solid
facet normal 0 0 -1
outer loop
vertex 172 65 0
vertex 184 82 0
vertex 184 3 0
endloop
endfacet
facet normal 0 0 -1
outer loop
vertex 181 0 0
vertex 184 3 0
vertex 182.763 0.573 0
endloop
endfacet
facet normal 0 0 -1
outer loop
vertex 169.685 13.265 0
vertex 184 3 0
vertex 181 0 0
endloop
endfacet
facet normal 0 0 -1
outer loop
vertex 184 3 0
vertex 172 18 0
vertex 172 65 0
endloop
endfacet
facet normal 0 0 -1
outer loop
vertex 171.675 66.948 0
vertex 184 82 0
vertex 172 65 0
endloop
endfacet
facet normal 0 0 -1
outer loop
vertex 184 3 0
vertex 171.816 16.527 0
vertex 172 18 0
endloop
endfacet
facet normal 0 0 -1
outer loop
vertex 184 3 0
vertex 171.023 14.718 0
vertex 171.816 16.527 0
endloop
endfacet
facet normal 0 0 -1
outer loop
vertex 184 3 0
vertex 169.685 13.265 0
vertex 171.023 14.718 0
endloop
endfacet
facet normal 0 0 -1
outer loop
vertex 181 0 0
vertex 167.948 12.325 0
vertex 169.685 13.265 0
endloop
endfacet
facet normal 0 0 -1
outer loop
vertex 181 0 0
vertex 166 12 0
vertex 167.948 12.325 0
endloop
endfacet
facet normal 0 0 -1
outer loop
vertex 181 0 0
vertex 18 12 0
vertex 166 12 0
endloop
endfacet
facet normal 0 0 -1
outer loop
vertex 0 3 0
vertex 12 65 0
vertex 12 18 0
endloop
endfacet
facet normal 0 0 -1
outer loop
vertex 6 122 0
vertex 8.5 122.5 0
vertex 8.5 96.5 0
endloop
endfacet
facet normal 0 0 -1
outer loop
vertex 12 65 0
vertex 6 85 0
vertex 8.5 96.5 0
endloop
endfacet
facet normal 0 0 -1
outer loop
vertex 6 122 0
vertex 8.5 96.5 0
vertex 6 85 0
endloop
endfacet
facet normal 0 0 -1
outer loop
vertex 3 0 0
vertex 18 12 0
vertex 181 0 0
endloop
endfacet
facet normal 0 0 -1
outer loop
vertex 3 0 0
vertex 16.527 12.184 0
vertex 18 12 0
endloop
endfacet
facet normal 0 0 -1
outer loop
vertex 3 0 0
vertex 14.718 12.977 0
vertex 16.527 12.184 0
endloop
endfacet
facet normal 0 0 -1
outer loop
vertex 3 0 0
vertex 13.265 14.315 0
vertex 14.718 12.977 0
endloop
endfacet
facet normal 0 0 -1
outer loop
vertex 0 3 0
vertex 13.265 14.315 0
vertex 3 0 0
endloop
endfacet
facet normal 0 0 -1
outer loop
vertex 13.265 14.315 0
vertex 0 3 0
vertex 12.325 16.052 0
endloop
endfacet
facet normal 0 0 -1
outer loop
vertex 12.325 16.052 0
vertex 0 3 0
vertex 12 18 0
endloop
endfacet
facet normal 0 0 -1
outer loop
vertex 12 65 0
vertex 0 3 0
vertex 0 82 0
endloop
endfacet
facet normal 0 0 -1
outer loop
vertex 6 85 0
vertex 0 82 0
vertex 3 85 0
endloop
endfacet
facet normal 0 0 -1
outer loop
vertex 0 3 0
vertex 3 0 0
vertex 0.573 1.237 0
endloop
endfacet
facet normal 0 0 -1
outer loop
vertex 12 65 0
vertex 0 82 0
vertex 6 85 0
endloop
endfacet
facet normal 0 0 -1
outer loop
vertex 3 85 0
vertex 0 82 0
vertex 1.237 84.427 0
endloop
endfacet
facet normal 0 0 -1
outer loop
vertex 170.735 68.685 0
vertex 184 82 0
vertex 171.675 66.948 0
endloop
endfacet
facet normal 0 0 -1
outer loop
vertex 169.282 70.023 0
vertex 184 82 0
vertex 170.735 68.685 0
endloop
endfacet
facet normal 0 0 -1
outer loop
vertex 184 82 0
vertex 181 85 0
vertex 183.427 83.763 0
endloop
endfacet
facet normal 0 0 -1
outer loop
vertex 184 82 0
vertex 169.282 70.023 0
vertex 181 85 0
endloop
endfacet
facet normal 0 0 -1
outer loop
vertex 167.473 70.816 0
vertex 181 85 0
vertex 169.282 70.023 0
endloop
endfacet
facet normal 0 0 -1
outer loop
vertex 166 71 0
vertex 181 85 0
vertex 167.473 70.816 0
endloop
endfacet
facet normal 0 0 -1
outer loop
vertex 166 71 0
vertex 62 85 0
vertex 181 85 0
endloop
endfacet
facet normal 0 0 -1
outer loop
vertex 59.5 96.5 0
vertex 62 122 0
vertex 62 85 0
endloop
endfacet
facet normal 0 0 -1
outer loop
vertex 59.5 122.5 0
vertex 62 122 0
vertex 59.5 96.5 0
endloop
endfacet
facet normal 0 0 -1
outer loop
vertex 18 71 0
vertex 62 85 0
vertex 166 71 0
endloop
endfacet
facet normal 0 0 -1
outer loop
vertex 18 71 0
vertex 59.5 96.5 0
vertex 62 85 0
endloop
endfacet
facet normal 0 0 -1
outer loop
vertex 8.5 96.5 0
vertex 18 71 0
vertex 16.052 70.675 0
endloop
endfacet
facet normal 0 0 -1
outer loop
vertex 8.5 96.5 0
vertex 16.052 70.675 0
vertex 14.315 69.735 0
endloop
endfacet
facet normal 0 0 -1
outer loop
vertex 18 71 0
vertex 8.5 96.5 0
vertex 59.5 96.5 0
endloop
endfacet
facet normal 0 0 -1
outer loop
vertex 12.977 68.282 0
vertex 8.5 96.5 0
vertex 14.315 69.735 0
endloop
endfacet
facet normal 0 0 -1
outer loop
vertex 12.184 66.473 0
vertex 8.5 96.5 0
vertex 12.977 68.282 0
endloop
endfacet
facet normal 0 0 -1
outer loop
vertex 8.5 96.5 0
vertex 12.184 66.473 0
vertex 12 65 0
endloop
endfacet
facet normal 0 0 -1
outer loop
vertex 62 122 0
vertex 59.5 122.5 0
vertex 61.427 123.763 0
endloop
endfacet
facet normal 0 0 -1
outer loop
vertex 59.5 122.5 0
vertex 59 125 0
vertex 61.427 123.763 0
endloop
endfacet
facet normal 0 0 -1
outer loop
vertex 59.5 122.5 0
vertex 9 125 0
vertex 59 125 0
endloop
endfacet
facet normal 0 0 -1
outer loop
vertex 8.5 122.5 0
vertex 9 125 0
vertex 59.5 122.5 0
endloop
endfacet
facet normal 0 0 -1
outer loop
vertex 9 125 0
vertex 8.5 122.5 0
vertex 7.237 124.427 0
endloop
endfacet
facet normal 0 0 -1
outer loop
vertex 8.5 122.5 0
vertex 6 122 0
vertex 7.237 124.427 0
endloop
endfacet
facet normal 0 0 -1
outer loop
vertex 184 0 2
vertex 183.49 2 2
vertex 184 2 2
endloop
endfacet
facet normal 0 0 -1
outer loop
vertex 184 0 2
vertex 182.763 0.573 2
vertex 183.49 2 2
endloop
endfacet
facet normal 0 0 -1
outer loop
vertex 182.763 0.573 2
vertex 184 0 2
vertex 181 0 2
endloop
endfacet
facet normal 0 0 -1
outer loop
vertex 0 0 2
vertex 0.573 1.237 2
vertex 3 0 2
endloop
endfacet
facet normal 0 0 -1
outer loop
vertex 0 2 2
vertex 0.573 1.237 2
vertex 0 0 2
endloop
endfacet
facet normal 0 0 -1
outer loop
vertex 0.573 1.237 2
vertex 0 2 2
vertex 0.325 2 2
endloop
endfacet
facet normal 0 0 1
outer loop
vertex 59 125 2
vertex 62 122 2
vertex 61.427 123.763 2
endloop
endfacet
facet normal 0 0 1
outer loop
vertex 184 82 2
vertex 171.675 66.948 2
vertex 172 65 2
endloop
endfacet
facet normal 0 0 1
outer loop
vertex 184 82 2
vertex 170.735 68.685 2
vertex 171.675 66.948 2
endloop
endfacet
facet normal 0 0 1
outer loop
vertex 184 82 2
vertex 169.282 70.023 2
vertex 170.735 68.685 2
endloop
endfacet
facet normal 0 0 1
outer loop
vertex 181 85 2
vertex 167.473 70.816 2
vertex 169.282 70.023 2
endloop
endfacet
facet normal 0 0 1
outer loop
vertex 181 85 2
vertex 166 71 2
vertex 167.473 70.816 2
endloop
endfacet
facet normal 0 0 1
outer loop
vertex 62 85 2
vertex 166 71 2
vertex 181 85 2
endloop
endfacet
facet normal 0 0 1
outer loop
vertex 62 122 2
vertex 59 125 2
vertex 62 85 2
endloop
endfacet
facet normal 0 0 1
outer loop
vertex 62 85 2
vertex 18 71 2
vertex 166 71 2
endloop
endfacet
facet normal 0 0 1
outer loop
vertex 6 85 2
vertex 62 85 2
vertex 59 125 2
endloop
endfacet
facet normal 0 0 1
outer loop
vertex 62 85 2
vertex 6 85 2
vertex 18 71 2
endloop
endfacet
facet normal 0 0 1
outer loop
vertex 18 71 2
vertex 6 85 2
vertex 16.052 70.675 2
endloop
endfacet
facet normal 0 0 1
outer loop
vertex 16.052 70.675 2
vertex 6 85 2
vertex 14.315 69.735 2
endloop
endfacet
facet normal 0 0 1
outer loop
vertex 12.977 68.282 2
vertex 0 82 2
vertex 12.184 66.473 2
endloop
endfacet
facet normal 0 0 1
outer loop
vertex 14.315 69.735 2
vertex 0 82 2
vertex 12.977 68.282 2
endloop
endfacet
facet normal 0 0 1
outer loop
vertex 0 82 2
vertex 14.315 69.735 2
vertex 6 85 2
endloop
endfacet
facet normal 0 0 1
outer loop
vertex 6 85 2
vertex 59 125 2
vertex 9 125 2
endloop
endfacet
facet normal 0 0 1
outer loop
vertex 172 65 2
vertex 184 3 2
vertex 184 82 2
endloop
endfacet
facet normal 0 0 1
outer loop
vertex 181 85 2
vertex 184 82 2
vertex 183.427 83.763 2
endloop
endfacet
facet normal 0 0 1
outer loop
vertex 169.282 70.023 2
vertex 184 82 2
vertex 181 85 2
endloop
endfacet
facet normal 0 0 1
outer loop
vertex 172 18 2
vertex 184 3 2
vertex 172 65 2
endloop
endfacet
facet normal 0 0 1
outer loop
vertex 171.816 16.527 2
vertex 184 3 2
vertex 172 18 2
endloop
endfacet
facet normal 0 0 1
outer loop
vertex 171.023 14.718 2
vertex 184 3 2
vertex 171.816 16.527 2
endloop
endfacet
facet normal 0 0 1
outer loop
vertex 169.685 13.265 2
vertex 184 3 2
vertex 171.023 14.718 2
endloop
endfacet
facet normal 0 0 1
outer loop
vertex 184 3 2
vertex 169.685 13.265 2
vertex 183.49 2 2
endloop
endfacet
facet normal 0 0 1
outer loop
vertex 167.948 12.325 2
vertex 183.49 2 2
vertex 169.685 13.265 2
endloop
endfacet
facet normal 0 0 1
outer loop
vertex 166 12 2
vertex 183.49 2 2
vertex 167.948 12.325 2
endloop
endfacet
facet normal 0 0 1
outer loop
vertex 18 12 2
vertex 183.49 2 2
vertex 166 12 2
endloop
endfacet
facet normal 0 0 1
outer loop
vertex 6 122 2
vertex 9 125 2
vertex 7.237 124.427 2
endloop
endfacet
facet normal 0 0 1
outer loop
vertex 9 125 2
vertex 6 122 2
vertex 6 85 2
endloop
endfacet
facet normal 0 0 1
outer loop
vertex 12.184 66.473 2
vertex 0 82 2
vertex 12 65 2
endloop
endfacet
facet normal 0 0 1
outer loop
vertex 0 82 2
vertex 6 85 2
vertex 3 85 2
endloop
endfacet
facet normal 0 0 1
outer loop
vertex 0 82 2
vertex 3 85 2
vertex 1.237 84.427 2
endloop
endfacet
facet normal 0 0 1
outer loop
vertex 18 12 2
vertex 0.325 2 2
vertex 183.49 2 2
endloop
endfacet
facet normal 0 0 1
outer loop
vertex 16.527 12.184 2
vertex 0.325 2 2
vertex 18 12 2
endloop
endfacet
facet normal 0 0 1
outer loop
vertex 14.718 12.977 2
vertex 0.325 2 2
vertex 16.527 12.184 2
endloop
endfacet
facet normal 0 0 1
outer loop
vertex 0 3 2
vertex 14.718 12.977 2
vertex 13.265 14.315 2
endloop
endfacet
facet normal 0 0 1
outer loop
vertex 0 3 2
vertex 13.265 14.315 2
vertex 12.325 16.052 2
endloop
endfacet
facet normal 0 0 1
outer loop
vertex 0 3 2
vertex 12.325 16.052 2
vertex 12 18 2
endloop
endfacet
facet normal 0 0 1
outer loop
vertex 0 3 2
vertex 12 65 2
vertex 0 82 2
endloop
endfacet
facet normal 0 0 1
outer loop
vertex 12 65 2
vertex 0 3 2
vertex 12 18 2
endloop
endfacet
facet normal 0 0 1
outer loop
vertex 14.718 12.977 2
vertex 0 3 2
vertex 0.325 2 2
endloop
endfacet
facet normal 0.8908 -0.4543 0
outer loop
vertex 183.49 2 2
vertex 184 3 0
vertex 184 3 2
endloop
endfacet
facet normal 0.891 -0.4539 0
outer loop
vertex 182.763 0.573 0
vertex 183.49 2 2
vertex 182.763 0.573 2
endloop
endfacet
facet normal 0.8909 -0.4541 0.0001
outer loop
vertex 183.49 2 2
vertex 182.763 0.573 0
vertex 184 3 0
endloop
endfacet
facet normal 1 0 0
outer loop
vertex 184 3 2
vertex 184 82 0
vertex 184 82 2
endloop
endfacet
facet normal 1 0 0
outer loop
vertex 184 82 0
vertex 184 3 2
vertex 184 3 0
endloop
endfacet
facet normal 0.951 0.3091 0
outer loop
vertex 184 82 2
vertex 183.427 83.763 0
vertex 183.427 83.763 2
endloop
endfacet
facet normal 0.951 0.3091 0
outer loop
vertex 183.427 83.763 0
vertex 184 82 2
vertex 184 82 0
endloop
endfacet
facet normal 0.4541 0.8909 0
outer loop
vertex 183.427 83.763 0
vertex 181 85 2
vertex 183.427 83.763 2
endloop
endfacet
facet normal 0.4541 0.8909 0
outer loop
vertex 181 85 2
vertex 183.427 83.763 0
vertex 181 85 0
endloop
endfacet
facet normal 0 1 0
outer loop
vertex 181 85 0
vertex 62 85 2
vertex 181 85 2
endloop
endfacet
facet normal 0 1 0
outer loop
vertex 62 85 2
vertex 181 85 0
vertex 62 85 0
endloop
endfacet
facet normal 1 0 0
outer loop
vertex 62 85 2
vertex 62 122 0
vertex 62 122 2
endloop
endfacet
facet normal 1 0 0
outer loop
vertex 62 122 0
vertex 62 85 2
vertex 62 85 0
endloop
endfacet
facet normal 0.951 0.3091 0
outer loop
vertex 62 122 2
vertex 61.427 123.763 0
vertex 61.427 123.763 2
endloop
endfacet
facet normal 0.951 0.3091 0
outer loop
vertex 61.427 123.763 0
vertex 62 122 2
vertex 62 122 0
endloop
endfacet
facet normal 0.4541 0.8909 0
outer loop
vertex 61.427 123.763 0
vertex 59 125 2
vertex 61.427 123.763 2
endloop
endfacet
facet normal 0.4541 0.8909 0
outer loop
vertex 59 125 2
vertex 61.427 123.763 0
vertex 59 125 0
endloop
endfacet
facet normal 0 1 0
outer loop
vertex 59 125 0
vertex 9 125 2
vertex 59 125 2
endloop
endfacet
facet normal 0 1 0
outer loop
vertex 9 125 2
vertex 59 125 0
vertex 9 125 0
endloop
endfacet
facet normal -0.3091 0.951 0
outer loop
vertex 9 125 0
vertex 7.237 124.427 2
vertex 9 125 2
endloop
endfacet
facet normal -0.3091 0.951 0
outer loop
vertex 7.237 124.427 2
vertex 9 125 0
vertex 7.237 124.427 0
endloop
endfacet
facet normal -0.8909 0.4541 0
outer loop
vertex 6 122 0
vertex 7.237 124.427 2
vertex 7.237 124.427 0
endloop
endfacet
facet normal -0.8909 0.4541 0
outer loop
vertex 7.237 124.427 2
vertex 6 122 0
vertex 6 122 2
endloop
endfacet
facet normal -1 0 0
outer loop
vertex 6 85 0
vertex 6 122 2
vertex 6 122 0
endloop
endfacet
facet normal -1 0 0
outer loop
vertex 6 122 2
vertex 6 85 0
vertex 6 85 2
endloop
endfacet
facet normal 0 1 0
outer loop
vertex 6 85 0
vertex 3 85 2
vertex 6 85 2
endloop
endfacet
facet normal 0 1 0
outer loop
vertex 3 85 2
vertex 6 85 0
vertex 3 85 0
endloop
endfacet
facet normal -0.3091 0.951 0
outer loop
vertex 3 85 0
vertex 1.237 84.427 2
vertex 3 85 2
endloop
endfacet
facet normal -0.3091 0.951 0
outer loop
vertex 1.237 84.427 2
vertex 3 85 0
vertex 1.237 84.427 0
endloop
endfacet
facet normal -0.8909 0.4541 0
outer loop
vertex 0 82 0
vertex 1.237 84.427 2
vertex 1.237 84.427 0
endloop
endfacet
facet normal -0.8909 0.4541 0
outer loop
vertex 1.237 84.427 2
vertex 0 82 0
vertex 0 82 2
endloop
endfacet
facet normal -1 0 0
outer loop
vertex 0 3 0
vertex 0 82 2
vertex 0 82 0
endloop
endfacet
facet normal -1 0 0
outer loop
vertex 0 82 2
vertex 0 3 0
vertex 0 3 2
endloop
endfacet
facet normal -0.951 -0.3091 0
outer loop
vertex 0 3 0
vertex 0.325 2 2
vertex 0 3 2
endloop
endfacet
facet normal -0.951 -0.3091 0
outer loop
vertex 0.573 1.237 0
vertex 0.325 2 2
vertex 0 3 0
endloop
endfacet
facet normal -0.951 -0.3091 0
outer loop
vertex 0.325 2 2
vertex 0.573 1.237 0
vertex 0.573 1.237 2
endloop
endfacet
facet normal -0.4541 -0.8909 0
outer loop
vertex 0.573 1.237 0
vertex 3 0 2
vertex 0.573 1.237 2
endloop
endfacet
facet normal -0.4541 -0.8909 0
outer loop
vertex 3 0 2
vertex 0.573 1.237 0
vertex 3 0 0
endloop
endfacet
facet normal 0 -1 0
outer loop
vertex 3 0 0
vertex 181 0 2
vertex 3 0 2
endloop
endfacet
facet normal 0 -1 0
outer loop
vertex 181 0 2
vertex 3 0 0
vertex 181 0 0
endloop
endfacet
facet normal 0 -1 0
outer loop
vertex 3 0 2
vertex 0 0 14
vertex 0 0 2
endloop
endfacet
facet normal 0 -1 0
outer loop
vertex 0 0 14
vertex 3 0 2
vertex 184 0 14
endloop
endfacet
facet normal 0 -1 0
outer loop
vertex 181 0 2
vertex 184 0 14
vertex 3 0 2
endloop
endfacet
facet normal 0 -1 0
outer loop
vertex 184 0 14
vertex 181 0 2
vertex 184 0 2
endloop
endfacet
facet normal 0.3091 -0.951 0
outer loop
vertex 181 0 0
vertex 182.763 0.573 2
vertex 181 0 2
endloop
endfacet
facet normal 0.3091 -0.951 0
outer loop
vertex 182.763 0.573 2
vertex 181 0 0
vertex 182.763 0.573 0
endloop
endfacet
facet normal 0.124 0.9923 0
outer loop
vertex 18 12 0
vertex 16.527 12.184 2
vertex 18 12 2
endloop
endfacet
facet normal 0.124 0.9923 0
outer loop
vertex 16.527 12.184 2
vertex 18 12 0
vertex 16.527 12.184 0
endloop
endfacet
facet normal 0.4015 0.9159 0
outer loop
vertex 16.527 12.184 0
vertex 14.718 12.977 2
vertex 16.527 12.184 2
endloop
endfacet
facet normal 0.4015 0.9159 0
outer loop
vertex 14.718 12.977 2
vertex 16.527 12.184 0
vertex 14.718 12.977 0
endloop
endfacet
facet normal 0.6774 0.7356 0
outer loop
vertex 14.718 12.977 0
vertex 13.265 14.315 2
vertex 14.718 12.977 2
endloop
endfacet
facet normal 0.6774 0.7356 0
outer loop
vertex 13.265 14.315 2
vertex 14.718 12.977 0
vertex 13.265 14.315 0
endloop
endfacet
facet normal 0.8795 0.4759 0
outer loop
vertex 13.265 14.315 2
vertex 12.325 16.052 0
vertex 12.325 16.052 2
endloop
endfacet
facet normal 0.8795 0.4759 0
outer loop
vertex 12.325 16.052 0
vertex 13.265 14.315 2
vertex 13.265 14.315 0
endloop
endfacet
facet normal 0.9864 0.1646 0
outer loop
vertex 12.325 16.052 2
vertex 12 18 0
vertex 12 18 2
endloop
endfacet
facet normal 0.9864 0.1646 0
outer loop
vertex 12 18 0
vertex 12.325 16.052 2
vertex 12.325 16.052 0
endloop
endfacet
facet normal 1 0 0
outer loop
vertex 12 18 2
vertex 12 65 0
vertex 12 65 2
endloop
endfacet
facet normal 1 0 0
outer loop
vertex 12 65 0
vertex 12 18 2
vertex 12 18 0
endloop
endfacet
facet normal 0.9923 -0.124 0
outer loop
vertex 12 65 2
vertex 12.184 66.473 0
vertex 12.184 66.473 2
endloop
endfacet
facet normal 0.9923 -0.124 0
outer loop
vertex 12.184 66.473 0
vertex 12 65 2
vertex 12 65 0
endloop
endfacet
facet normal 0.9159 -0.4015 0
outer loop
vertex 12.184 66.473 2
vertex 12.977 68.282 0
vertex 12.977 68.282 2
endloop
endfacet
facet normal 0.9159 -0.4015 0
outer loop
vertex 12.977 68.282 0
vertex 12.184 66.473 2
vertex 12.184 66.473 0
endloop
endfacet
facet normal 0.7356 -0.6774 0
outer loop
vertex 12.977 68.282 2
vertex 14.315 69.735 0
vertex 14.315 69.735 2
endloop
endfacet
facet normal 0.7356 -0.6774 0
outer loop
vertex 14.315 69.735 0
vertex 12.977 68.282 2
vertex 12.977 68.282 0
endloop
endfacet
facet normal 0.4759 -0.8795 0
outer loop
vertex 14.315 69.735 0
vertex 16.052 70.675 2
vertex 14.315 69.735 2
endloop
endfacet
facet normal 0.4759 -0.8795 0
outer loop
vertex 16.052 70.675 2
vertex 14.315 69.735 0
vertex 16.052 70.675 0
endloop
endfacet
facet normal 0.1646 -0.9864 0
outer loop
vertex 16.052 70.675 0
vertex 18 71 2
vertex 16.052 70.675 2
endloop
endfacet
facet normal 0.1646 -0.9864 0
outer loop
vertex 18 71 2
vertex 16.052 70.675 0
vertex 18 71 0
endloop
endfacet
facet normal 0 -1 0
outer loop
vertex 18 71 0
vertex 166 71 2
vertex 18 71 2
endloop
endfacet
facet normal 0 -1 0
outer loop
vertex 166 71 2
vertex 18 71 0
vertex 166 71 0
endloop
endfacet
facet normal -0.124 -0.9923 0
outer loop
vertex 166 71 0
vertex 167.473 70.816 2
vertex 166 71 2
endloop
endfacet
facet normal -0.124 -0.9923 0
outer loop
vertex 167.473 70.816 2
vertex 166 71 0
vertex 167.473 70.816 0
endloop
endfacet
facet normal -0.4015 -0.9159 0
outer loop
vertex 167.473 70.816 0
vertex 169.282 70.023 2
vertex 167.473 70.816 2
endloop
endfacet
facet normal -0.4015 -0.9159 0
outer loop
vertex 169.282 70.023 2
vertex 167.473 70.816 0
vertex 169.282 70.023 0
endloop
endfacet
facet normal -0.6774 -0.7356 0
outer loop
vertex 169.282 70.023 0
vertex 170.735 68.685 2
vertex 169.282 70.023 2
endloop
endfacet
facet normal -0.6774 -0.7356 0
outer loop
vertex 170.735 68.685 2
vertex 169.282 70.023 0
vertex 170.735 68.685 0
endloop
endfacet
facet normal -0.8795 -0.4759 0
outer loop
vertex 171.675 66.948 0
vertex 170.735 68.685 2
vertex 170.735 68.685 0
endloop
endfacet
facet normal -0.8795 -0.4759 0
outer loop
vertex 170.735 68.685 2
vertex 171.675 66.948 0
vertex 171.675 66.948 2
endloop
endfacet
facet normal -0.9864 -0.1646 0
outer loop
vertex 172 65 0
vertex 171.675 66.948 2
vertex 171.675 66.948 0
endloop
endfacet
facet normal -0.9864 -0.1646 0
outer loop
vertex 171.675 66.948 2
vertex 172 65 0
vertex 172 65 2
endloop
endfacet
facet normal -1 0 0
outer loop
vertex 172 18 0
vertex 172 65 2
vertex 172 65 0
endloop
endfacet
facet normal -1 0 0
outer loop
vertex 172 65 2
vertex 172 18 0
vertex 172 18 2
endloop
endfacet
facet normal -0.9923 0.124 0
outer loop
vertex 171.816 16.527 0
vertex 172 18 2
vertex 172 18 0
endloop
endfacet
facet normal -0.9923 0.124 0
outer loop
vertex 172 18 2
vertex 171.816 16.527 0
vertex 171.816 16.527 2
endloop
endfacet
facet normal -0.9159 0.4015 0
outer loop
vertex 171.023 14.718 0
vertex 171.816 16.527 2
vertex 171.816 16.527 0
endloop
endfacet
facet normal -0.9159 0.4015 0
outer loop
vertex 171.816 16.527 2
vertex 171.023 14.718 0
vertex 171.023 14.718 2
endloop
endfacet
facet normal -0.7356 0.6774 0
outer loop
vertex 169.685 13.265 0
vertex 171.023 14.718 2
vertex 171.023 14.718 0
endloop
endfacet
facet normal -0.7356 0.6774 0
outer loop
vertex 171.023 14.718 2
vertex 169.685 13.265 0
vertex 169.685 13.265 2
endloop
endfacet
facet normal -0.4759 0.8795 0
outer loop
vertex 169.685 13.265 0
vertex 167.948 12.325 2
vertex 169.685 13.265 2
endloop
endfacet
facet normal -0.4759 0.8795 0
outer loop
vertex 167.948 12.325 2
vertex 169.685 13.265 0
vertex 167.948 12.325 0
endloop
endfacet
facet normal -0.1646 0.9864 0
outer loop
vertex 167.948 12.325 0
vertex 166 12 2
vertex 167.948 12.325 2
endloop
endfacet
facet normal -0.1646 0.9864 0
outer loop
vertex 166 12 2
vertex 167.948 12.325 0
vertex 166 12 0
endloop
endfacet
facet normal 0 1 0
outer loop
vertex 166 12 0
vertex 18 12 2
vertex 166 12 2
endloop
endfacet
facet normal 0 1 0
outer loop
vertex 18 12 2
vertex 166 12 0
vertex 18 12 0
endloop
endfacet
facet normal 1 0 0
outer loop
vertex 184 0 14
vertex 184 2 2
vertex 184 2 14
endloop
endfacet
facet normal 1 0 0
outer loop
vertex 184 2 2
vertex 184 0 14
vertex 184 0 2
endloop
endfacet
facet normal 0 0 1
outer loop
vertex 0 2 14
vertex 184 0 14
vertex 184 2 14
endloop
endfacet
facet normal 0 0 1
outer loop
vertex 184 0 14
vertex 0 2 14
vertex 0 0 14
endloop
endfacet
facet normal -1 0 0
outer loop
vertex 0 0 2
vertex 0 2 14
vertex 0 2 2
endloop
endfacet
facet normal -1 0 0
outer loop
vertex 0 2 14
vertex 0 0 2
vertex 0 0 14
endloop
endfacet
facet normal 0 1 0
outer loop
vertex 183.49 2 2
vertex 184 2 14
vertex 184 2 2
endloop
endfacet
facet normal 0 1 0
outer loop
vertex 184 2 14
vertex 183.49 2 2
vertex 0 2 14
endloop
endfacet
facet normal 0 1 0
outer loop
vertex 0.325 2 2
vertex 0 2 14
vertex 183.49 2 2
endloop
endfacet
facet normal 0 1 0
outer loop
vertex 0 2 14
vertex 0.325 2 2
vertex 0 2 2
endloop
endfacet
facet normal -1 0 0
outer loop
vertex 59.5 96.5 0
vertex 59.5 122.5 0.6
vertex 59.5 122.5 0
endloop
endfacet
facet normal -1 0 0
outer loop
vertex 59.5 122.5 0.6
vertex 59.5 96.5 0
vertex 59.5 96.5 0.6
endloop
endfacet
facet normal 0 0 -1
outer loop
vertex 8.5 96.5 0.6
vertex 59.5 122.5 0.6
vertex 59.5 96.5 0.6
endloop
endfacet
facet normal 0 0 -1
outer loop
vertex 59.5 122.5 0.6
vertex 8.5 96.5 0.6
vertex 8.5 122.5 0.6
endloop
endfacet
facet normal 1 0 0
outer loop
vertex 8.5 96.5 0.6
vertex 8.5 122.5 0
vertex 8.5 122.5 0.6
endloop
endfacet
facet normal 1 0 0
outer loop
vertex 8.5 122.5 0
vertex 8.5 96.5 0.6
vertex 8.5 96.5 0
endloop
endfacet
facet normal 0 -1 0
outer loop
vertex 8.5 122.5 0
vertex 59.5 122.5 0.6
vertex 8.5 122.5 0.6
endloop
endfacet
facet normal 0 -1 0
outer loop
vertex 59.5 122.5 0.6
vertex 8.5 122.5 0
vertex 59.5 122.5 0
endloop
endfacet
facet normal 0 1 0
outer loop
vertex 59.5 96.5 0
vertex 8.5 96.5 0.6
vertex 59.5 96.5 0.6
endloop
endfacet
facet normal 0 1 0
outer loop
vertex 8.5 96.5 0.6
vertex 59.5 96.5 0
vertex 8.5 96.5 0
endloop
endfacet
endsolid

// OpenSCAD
// Screen protector drawer divider with a label pocket on a staggered tab.
// Packs stand on their long edge, face towards you, filed behind each divider.
// Measure one pack and set pack_long / pack_short, then render one STL per tab position.
// Tablet packs: e.g. pack_long = 280, pack_short = 200, divider_width = 200, foot_depth = 18.
// A divider narrower than the pack still separates groups: the packs lean on it.
// Print flat, front (label) face down. No supports needed. PLA or PETG, 0.2 mm layers.

/* [Your packs] */
pack_long  = 180;   // pack's long side, lies across the drawer (mm)
pack_short = 95;    // pack height when standing on its long edge (mm)
clearance  = 4;     // extra width so the divider slides in easily (mm)
divider_width = 0;  // 0 = pack_long + clearance. Set narrower for tablet packs (e.g. 200) so it fits the print bed

/* [Label] */
label_w      = 50;  // label width (mm): 50 x 25 thermal label by default
label_h      = 25;  // label height (mm)
pocket_depth = 0.6; // recess the label sits in (mm)
tab_show     = 30;  // how far the tab rises above the tops of the packs (mm)
tab_pos      = "left"; // [left, centre, right] print a mix so tabs don't hide each other

/* [Body] */
thickness  = 2;     // plate thickness (mm)
foot_depth = 12;    // foot behind the divider that stops it tipping (mm)
window     = true;  // cut-out to save filament

W      = divider_width > 0 ? divider_width : pack_long + clearance;
body_h = pack_short - 10;
top    = pack_short + tab_show;
tab_w  = label_w + 6;
tab_x  = tab_pos == "left" ? 6 : tab_pos == "right" ? W - 6 - tab_w : (W - tab_w) / 2;
tab_y0 = body_h - 12;

module rr(w, h, r) { translate([r, r]) offset(r = r) square([w - 2 * r, h - 2 * r]); }

module outline() {
  union() {
    rr(W, body_h, 3);
    translate([tab_x, tab_y0]) rr(tab_w, top - tab_y0, 3);
  }
}

difference() {
  union() {
    linear_extrude(thickness) difference() {
      outline();
      if (window) translate([12, 12]) rr(W - 24, body_h - 26, 6);
    }
    // foot on the back face, along the bottom edge
    translate([0, 0, thickness]) cube([W, 2, foot_depth]);
  }
  // label pocket on the front face (the face on the print bed)
  translate([tab_x + (tab_w - label_w - 1) / 2, top - 2.5 - (label_h + 1), -0.01])
    cube([label_w + 1, label_h + 1, pocket_depth + 0.01]);
}
